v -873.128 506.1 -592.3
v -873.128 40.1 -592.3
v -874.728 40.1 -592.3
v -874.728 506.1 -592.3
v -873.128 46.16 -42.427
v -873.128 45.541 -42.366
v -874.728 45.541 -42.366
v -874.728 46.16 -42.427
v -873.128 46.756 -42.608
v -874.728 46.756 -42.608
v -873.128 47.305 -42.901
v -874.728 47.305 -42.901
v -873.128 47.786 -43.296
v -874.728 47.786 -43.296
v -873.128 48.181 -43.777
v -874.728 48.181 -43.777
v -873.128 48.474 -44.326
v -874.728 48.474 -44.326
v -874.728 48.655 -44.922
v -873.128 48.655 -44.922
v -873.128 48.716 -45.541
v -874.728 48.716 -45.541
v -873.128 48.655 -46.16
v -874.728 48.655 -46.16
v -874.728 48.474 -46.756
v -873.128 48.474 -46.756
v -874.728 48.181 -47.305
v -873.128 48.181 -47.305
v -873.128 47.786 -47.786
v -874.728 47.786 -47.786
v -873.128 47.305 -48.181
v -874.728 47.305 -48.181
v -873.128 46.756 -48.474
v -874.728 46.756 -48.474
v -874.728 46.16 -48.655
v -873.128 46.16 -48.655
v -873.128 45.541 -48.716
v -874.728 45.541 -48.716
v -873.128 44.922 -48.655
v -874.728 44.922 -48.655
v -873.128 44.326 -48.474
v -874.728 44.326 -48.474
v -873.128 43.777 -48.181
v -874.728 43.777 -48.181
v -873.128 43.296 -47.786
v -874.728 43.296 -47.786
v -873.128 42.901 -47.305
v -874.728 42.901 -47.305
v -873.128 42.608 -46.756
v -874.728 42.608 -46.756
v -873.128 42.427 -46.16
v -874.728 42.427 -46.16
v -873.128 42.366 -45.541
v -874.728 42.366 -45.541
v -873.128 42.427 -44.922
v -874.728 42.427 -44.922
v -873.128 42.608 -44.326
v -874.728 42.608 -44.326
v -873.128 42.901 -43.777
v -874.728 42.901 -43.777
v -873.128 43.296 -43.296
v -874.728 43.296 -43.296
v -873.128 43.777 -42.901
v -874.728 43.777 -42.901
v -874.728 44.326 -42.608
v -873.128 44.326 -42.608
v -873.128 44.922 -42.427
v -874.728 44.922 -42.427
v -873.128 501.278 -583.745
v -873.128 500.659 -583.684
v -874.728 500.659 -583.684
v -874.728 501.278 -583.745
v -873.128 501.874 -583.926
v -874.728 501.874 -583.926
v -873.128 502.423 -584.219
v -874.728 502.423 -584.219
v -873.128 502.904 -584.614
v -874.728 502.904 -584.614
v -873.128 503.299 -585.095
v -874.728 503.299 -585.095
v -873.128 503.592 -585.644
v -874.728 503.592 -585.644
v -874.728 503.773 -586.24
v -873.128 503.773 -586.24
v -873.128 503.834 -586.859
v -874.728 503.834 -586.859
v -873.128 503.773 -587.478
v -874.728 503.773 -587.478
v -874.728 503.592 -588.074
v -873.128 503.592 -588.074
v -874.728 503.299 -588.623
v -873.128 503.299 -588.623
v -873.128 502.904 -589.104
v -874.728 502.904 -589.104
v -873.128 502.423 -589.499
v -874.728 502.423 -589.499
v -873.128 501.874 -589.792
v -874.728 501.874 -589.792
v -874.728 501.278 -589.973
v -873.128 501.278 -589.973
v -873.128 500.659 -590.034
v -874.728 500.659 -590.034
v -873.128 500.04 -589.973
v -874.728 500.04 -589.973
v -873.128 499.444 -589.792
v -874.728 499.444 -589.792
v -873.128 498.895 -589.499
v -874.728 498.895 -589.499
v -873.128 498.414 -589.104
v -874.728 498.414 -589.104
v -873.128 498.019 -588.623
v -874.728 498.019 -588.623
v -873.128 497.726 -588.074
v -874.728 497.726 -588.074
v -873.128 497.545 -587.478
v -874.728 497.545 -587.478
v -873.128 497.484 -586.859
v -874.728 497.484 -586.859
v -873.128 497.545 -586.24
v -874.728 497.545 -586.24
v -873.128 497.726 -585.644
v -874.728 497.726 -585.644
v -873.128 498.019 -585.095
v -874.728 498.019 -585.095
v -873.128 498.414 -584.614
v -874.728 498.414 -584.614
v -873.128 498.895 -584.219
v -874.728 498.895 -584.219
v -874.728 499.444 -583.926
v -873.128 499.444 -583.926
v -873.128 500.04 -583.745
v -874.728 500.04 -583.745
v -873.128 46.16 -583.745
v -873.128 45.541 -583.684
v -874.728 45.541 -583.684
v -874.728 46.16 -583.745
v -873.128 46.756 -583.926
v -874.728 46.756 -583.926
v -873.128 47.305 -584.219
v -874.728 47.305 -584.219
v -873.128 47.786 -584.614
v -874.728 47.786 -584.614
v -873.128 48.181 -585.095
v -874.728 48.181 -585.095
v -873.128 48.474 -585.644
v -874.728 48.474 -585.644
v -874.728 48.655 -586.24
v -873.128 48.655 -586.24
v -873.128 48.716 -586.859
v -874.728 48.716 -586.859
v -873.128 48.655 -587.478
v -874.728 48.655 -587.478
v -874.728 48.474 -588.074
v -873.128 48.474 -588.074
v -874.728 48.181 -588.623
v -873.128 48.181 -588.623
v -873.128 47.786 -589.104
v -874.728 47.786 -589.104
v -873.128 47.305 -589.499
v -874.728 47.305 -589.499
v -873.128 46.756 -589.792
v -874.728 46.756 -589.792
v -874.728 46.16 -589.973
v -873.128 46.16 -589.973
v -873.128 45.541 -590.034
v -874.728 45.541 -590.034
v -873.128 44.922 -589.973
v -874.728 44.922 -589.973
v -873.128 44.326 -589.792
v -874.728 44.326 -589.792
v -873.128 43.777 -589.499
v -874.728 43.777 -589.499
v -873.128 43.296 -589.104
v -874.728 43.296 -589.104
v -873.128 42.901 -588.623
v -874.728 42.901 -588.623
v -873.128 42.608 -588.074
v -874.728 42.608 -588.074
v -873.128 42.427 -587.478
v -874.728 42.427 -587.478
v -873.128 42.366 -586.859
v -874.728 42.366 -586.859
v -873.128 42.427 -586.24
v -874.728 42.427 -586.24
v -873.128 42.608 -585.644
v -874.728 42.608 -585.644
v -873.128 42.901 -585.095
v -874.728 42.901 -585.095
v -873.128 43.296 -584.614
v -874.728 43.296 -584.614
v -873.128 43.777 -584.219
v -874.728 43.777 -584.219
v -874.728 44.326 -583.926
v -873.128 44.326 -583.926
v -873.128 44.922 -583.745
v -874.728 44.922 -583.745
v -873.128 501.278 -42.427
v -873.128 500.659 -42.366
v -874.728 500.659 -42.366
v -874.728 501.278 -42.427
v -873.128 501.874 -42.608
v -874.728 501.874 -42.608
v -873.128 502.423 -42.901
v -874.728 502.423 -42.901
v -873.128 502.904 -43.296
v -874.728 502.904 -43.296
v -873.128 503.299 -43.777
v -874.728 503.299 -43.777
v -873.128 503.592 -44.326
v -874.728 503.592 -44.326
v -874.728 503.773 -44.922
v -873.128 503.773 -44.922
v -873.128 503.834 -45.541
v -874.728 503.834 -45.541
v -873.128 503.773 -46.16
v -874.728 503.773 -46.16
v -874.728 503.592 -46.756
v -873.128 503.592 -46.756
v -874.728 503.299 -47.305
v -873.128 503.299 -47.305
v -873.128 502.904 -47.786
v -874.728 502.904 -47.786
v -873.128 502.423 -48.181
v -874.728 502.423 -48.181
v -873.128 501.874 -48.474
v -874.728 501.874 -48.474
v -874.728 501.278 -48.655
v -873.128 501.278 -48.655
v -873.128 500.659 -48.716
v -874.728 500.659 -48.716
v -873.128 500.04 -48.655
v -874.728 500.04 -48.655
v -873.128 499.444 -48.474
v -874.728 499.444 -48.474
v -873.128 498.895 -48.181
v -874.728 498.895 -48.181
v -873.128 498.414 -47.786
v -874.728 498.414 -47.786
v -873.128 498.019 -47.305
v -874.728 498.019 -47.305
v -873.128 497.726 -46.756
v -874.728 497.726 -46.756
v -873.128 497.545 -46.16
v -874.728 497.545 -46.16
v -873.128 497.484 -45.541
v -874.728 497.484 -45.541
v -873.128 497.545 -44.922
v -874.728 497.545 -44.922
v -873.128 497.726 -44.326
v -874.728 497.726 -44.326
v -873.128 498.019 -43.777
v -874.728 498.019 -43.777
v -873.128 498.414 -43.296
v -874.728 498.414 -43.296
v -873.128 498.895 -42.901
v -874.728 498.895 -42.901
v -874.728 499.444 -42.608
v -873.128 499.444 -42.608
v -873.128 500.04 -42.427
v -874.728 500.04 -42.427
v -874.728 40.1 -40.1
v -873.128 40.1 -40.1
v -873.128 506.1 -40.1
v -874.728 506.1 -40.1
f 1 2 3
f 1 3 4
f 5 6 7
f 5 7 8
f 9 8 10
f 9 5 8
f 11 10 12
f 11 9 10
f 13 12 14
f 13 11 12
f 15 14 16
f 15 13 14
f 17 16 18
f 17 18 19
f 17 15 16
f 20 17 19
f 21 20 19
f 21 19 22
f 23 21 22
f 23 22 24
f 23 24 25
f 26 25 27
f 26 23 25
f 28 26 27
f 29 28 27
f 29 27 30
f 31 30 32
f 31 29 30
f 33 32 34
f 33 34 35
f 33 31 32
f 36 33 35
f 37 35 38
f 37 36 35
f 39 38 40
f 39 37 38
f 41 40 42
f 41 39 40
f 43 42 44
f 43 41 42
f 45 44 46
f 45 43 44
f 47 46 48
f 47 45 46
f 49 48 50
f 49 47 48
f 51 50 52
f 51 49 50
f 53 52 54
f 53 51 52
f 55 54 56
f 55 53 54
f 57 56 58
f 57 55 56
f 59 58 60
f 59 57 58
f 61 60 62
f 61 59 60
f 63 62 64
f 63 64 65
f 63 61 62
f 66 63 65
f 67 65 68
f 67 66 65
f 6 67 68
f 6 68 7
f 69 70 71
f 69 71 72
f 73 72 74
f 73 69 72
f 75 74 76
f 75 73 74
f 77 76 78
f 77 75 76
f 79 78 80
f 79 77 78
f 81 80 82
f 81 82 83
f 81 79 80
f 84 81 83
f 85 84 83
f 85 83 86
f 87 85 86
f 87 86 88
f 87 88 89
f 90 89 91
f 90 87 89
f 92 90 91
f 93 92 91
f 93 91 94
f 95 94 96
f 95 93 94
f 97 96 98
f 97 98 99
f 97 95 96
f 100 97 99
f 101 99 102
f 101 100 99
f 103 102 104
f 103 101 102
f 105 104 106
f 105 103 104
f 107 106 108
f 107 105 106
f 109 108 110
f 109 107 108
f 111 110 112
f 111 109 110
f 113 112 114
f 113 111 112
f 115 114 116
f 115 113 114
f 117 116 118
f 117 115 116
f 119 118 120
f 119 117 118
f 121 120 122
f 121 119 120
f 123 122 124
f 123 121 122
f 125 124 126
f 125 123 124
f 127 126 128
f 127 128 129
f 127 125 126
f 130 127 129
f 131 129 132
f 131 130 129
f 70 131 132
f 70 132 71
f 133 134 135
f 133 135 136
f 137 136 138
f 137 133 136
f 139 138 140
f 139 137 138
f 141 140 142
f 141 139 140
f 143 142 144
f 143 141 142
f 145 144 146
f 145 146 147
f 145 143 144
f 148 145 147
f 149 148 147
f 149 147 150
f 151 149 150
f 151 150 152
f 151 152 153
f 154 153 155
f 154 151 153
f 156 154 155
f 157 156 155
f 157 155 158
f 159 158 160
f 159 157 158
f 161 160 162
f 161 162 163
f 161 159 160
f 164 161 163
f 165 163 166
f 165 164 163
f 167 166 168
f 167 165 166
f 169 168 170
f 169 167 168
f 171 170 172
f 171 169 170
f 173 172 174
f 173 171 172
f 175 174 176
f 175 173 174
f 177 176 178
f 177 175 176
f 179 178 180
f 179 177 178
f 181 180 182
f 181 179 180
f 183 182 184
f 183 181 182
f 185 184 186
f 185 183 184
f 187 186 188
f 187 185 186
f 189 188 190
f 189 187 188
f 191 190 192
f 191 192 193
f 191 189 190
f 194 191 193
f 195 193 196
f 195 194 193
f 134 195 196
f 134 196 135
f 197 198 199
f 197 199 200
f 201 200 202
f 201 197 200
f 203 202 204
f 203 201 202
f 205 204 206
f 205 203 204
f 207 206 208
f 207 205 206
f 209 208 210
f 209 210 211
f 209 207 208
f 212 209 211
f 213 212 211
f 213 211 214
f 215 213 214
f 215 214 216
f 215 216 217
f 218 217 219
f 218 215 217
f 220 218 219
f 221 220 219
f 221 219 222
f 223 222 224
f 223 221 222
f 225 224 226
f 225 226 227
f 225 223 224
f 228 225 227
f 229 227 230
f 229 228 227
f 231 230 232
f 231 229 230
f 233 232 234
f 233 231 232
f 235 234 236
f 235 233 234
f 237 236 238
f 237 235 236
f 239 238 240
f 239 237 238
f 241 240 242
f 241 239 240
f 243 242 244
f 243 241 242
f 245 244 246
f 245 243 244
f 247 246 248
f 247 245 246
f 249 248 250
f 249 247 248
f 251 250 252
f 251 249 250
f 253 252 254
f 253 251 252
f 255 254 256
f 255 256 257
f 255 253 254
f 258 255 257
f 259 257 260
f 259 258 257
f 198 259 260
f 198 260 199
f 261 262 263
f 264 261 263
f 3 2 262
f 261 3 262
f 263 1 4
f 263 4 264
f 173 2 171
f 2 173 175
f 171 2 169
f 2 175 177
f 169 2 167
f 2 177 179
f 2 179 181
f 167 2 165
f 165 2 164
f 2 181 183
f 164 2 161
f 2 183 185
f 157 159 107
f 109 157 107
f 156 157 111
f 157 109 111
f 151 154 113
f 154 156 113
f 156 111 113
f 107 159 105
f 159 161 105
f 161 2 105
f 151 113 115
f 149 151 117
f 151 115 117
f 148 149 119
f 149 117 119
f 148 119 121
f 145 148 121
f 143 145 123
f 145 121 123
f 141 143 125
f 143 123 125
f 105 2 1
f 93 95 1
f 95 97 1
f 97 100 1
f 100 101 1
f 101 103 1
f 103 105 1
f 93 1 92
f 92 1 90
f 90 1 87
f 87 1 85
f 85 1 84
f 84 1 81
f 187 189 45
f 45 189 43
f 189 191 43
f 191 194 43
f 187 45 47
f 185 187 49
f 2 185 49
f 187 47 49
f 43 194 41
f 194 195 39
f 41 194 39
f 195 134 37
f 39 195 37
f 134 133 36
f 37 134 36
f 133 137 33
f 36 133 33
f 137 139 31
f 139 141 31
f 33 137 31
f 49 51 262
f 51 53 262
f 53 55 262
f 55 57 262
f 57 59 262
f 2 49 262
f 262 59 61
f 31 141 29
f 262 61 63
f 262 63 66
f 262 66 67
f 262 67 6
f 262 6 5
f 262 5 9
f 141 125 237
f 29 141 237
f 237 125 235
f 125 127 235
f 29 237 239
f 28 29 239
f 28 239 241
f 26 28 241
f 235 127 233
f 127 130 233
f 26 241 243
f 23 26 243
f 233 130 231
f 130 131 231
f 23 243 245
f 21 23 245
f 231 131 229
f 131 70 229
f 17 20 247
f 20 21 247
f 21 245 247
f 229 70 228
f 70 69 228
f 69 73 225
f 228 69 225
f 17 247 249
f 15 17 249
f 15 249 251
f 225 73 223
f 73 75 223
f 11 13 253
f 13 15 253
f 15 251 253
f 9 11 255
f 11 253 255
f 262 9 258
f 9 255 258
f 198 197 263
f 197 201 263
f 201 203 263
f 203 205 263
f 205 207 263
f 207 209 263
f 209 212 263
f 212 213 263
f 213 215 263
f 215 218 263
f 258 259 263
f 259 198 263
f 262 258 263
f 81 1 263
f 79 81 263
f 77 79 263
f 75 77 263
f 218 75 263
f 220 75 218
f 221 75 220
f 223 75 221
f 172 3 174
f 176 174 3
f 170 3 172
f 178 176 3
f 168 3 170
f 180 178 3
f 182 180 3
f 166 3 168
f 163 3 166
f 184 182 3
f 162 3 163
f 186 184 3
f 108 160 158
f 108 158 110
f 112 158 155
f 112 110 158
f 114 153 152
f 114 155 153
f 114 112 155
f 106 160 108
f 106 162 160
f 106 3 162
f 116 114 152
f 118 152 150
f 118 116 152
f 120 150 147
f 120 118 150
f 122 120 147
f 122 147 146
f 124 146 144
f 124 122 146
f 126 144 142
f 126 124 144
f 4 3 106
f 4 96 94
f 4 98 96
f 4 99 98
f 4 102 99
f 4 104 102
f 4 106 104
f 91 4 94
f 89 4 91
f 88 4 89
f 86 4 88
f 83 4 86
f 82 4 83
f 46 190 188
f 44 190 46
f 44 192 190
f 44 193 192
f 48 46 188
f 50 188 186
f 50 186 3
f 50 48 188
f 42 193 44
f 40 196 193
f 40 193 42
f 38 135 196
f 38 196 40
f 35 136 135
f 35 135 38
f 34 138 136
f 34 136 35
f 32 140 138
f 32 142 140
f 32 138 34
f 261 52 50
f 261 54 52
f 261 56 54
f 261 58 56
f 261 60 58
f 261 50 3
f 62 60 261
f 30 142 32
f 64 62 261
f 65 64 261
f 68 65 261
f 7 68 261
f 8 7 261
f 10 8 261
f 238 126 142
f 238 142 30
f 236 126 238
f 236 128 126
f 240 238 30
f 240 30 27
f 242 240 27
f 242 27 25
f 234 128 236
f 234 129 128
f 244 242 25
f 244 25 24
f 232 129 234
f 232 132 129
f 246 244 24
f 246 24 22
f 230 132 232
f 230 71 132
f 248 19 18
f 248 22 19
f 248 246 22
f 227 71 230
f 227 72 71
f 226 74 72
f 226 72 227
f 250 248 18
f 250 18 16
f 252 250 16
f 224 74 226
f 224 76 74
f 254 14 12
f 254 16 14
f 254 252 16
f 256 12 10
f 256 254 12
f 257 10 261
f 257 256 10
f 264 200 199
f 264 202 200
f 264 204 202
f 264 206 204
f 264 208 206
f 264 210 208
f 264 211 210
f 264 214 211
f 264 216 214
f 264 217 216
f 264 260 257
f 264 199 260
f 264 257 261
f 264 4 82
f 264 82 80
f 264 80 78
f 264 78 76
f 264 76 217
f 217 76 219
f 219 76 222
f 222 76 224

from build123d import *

# Parameters (mm, degrees)
SKETCH1_W           = 552.199999858
SKETCH1_H           = 466.00054246
SKETCH1_R           = 3.175
BOSS_EXTRUDE1_DEPTH = 1.6002


with BuildPart() as part:
    # Sketch1 → Boss-Extrude1 (new body)
    with BuildSketch(Plane.ZY.offset(873.127754017)):
        with Locations((-316.2, 273.100169628)):
            Rectangle(SKETCH1_W, SKETCH1_H)
        with Locations((-586.858968152, 500.658968)):
            Circle(SKETCH1_R, mode=Mode.SUBTRACT)
        with Locations((-45.541032, 500.658968)):
            Circle(SKETCH1_R, mode=Mode.SUBTRACT)
        with Locations((-45.541032, 45.541031777)):
            Circle(SKETCH1_R, mode=Mode.SUBTRACT)
        with Locations((-586.858968152, 45.541031777)):
            Circle(SKETCH1_R, mode=Mode.SUBTRACT)
    extrude(amount=BOSS_EXTRUDE1_DEPTH)


solid = part.part
